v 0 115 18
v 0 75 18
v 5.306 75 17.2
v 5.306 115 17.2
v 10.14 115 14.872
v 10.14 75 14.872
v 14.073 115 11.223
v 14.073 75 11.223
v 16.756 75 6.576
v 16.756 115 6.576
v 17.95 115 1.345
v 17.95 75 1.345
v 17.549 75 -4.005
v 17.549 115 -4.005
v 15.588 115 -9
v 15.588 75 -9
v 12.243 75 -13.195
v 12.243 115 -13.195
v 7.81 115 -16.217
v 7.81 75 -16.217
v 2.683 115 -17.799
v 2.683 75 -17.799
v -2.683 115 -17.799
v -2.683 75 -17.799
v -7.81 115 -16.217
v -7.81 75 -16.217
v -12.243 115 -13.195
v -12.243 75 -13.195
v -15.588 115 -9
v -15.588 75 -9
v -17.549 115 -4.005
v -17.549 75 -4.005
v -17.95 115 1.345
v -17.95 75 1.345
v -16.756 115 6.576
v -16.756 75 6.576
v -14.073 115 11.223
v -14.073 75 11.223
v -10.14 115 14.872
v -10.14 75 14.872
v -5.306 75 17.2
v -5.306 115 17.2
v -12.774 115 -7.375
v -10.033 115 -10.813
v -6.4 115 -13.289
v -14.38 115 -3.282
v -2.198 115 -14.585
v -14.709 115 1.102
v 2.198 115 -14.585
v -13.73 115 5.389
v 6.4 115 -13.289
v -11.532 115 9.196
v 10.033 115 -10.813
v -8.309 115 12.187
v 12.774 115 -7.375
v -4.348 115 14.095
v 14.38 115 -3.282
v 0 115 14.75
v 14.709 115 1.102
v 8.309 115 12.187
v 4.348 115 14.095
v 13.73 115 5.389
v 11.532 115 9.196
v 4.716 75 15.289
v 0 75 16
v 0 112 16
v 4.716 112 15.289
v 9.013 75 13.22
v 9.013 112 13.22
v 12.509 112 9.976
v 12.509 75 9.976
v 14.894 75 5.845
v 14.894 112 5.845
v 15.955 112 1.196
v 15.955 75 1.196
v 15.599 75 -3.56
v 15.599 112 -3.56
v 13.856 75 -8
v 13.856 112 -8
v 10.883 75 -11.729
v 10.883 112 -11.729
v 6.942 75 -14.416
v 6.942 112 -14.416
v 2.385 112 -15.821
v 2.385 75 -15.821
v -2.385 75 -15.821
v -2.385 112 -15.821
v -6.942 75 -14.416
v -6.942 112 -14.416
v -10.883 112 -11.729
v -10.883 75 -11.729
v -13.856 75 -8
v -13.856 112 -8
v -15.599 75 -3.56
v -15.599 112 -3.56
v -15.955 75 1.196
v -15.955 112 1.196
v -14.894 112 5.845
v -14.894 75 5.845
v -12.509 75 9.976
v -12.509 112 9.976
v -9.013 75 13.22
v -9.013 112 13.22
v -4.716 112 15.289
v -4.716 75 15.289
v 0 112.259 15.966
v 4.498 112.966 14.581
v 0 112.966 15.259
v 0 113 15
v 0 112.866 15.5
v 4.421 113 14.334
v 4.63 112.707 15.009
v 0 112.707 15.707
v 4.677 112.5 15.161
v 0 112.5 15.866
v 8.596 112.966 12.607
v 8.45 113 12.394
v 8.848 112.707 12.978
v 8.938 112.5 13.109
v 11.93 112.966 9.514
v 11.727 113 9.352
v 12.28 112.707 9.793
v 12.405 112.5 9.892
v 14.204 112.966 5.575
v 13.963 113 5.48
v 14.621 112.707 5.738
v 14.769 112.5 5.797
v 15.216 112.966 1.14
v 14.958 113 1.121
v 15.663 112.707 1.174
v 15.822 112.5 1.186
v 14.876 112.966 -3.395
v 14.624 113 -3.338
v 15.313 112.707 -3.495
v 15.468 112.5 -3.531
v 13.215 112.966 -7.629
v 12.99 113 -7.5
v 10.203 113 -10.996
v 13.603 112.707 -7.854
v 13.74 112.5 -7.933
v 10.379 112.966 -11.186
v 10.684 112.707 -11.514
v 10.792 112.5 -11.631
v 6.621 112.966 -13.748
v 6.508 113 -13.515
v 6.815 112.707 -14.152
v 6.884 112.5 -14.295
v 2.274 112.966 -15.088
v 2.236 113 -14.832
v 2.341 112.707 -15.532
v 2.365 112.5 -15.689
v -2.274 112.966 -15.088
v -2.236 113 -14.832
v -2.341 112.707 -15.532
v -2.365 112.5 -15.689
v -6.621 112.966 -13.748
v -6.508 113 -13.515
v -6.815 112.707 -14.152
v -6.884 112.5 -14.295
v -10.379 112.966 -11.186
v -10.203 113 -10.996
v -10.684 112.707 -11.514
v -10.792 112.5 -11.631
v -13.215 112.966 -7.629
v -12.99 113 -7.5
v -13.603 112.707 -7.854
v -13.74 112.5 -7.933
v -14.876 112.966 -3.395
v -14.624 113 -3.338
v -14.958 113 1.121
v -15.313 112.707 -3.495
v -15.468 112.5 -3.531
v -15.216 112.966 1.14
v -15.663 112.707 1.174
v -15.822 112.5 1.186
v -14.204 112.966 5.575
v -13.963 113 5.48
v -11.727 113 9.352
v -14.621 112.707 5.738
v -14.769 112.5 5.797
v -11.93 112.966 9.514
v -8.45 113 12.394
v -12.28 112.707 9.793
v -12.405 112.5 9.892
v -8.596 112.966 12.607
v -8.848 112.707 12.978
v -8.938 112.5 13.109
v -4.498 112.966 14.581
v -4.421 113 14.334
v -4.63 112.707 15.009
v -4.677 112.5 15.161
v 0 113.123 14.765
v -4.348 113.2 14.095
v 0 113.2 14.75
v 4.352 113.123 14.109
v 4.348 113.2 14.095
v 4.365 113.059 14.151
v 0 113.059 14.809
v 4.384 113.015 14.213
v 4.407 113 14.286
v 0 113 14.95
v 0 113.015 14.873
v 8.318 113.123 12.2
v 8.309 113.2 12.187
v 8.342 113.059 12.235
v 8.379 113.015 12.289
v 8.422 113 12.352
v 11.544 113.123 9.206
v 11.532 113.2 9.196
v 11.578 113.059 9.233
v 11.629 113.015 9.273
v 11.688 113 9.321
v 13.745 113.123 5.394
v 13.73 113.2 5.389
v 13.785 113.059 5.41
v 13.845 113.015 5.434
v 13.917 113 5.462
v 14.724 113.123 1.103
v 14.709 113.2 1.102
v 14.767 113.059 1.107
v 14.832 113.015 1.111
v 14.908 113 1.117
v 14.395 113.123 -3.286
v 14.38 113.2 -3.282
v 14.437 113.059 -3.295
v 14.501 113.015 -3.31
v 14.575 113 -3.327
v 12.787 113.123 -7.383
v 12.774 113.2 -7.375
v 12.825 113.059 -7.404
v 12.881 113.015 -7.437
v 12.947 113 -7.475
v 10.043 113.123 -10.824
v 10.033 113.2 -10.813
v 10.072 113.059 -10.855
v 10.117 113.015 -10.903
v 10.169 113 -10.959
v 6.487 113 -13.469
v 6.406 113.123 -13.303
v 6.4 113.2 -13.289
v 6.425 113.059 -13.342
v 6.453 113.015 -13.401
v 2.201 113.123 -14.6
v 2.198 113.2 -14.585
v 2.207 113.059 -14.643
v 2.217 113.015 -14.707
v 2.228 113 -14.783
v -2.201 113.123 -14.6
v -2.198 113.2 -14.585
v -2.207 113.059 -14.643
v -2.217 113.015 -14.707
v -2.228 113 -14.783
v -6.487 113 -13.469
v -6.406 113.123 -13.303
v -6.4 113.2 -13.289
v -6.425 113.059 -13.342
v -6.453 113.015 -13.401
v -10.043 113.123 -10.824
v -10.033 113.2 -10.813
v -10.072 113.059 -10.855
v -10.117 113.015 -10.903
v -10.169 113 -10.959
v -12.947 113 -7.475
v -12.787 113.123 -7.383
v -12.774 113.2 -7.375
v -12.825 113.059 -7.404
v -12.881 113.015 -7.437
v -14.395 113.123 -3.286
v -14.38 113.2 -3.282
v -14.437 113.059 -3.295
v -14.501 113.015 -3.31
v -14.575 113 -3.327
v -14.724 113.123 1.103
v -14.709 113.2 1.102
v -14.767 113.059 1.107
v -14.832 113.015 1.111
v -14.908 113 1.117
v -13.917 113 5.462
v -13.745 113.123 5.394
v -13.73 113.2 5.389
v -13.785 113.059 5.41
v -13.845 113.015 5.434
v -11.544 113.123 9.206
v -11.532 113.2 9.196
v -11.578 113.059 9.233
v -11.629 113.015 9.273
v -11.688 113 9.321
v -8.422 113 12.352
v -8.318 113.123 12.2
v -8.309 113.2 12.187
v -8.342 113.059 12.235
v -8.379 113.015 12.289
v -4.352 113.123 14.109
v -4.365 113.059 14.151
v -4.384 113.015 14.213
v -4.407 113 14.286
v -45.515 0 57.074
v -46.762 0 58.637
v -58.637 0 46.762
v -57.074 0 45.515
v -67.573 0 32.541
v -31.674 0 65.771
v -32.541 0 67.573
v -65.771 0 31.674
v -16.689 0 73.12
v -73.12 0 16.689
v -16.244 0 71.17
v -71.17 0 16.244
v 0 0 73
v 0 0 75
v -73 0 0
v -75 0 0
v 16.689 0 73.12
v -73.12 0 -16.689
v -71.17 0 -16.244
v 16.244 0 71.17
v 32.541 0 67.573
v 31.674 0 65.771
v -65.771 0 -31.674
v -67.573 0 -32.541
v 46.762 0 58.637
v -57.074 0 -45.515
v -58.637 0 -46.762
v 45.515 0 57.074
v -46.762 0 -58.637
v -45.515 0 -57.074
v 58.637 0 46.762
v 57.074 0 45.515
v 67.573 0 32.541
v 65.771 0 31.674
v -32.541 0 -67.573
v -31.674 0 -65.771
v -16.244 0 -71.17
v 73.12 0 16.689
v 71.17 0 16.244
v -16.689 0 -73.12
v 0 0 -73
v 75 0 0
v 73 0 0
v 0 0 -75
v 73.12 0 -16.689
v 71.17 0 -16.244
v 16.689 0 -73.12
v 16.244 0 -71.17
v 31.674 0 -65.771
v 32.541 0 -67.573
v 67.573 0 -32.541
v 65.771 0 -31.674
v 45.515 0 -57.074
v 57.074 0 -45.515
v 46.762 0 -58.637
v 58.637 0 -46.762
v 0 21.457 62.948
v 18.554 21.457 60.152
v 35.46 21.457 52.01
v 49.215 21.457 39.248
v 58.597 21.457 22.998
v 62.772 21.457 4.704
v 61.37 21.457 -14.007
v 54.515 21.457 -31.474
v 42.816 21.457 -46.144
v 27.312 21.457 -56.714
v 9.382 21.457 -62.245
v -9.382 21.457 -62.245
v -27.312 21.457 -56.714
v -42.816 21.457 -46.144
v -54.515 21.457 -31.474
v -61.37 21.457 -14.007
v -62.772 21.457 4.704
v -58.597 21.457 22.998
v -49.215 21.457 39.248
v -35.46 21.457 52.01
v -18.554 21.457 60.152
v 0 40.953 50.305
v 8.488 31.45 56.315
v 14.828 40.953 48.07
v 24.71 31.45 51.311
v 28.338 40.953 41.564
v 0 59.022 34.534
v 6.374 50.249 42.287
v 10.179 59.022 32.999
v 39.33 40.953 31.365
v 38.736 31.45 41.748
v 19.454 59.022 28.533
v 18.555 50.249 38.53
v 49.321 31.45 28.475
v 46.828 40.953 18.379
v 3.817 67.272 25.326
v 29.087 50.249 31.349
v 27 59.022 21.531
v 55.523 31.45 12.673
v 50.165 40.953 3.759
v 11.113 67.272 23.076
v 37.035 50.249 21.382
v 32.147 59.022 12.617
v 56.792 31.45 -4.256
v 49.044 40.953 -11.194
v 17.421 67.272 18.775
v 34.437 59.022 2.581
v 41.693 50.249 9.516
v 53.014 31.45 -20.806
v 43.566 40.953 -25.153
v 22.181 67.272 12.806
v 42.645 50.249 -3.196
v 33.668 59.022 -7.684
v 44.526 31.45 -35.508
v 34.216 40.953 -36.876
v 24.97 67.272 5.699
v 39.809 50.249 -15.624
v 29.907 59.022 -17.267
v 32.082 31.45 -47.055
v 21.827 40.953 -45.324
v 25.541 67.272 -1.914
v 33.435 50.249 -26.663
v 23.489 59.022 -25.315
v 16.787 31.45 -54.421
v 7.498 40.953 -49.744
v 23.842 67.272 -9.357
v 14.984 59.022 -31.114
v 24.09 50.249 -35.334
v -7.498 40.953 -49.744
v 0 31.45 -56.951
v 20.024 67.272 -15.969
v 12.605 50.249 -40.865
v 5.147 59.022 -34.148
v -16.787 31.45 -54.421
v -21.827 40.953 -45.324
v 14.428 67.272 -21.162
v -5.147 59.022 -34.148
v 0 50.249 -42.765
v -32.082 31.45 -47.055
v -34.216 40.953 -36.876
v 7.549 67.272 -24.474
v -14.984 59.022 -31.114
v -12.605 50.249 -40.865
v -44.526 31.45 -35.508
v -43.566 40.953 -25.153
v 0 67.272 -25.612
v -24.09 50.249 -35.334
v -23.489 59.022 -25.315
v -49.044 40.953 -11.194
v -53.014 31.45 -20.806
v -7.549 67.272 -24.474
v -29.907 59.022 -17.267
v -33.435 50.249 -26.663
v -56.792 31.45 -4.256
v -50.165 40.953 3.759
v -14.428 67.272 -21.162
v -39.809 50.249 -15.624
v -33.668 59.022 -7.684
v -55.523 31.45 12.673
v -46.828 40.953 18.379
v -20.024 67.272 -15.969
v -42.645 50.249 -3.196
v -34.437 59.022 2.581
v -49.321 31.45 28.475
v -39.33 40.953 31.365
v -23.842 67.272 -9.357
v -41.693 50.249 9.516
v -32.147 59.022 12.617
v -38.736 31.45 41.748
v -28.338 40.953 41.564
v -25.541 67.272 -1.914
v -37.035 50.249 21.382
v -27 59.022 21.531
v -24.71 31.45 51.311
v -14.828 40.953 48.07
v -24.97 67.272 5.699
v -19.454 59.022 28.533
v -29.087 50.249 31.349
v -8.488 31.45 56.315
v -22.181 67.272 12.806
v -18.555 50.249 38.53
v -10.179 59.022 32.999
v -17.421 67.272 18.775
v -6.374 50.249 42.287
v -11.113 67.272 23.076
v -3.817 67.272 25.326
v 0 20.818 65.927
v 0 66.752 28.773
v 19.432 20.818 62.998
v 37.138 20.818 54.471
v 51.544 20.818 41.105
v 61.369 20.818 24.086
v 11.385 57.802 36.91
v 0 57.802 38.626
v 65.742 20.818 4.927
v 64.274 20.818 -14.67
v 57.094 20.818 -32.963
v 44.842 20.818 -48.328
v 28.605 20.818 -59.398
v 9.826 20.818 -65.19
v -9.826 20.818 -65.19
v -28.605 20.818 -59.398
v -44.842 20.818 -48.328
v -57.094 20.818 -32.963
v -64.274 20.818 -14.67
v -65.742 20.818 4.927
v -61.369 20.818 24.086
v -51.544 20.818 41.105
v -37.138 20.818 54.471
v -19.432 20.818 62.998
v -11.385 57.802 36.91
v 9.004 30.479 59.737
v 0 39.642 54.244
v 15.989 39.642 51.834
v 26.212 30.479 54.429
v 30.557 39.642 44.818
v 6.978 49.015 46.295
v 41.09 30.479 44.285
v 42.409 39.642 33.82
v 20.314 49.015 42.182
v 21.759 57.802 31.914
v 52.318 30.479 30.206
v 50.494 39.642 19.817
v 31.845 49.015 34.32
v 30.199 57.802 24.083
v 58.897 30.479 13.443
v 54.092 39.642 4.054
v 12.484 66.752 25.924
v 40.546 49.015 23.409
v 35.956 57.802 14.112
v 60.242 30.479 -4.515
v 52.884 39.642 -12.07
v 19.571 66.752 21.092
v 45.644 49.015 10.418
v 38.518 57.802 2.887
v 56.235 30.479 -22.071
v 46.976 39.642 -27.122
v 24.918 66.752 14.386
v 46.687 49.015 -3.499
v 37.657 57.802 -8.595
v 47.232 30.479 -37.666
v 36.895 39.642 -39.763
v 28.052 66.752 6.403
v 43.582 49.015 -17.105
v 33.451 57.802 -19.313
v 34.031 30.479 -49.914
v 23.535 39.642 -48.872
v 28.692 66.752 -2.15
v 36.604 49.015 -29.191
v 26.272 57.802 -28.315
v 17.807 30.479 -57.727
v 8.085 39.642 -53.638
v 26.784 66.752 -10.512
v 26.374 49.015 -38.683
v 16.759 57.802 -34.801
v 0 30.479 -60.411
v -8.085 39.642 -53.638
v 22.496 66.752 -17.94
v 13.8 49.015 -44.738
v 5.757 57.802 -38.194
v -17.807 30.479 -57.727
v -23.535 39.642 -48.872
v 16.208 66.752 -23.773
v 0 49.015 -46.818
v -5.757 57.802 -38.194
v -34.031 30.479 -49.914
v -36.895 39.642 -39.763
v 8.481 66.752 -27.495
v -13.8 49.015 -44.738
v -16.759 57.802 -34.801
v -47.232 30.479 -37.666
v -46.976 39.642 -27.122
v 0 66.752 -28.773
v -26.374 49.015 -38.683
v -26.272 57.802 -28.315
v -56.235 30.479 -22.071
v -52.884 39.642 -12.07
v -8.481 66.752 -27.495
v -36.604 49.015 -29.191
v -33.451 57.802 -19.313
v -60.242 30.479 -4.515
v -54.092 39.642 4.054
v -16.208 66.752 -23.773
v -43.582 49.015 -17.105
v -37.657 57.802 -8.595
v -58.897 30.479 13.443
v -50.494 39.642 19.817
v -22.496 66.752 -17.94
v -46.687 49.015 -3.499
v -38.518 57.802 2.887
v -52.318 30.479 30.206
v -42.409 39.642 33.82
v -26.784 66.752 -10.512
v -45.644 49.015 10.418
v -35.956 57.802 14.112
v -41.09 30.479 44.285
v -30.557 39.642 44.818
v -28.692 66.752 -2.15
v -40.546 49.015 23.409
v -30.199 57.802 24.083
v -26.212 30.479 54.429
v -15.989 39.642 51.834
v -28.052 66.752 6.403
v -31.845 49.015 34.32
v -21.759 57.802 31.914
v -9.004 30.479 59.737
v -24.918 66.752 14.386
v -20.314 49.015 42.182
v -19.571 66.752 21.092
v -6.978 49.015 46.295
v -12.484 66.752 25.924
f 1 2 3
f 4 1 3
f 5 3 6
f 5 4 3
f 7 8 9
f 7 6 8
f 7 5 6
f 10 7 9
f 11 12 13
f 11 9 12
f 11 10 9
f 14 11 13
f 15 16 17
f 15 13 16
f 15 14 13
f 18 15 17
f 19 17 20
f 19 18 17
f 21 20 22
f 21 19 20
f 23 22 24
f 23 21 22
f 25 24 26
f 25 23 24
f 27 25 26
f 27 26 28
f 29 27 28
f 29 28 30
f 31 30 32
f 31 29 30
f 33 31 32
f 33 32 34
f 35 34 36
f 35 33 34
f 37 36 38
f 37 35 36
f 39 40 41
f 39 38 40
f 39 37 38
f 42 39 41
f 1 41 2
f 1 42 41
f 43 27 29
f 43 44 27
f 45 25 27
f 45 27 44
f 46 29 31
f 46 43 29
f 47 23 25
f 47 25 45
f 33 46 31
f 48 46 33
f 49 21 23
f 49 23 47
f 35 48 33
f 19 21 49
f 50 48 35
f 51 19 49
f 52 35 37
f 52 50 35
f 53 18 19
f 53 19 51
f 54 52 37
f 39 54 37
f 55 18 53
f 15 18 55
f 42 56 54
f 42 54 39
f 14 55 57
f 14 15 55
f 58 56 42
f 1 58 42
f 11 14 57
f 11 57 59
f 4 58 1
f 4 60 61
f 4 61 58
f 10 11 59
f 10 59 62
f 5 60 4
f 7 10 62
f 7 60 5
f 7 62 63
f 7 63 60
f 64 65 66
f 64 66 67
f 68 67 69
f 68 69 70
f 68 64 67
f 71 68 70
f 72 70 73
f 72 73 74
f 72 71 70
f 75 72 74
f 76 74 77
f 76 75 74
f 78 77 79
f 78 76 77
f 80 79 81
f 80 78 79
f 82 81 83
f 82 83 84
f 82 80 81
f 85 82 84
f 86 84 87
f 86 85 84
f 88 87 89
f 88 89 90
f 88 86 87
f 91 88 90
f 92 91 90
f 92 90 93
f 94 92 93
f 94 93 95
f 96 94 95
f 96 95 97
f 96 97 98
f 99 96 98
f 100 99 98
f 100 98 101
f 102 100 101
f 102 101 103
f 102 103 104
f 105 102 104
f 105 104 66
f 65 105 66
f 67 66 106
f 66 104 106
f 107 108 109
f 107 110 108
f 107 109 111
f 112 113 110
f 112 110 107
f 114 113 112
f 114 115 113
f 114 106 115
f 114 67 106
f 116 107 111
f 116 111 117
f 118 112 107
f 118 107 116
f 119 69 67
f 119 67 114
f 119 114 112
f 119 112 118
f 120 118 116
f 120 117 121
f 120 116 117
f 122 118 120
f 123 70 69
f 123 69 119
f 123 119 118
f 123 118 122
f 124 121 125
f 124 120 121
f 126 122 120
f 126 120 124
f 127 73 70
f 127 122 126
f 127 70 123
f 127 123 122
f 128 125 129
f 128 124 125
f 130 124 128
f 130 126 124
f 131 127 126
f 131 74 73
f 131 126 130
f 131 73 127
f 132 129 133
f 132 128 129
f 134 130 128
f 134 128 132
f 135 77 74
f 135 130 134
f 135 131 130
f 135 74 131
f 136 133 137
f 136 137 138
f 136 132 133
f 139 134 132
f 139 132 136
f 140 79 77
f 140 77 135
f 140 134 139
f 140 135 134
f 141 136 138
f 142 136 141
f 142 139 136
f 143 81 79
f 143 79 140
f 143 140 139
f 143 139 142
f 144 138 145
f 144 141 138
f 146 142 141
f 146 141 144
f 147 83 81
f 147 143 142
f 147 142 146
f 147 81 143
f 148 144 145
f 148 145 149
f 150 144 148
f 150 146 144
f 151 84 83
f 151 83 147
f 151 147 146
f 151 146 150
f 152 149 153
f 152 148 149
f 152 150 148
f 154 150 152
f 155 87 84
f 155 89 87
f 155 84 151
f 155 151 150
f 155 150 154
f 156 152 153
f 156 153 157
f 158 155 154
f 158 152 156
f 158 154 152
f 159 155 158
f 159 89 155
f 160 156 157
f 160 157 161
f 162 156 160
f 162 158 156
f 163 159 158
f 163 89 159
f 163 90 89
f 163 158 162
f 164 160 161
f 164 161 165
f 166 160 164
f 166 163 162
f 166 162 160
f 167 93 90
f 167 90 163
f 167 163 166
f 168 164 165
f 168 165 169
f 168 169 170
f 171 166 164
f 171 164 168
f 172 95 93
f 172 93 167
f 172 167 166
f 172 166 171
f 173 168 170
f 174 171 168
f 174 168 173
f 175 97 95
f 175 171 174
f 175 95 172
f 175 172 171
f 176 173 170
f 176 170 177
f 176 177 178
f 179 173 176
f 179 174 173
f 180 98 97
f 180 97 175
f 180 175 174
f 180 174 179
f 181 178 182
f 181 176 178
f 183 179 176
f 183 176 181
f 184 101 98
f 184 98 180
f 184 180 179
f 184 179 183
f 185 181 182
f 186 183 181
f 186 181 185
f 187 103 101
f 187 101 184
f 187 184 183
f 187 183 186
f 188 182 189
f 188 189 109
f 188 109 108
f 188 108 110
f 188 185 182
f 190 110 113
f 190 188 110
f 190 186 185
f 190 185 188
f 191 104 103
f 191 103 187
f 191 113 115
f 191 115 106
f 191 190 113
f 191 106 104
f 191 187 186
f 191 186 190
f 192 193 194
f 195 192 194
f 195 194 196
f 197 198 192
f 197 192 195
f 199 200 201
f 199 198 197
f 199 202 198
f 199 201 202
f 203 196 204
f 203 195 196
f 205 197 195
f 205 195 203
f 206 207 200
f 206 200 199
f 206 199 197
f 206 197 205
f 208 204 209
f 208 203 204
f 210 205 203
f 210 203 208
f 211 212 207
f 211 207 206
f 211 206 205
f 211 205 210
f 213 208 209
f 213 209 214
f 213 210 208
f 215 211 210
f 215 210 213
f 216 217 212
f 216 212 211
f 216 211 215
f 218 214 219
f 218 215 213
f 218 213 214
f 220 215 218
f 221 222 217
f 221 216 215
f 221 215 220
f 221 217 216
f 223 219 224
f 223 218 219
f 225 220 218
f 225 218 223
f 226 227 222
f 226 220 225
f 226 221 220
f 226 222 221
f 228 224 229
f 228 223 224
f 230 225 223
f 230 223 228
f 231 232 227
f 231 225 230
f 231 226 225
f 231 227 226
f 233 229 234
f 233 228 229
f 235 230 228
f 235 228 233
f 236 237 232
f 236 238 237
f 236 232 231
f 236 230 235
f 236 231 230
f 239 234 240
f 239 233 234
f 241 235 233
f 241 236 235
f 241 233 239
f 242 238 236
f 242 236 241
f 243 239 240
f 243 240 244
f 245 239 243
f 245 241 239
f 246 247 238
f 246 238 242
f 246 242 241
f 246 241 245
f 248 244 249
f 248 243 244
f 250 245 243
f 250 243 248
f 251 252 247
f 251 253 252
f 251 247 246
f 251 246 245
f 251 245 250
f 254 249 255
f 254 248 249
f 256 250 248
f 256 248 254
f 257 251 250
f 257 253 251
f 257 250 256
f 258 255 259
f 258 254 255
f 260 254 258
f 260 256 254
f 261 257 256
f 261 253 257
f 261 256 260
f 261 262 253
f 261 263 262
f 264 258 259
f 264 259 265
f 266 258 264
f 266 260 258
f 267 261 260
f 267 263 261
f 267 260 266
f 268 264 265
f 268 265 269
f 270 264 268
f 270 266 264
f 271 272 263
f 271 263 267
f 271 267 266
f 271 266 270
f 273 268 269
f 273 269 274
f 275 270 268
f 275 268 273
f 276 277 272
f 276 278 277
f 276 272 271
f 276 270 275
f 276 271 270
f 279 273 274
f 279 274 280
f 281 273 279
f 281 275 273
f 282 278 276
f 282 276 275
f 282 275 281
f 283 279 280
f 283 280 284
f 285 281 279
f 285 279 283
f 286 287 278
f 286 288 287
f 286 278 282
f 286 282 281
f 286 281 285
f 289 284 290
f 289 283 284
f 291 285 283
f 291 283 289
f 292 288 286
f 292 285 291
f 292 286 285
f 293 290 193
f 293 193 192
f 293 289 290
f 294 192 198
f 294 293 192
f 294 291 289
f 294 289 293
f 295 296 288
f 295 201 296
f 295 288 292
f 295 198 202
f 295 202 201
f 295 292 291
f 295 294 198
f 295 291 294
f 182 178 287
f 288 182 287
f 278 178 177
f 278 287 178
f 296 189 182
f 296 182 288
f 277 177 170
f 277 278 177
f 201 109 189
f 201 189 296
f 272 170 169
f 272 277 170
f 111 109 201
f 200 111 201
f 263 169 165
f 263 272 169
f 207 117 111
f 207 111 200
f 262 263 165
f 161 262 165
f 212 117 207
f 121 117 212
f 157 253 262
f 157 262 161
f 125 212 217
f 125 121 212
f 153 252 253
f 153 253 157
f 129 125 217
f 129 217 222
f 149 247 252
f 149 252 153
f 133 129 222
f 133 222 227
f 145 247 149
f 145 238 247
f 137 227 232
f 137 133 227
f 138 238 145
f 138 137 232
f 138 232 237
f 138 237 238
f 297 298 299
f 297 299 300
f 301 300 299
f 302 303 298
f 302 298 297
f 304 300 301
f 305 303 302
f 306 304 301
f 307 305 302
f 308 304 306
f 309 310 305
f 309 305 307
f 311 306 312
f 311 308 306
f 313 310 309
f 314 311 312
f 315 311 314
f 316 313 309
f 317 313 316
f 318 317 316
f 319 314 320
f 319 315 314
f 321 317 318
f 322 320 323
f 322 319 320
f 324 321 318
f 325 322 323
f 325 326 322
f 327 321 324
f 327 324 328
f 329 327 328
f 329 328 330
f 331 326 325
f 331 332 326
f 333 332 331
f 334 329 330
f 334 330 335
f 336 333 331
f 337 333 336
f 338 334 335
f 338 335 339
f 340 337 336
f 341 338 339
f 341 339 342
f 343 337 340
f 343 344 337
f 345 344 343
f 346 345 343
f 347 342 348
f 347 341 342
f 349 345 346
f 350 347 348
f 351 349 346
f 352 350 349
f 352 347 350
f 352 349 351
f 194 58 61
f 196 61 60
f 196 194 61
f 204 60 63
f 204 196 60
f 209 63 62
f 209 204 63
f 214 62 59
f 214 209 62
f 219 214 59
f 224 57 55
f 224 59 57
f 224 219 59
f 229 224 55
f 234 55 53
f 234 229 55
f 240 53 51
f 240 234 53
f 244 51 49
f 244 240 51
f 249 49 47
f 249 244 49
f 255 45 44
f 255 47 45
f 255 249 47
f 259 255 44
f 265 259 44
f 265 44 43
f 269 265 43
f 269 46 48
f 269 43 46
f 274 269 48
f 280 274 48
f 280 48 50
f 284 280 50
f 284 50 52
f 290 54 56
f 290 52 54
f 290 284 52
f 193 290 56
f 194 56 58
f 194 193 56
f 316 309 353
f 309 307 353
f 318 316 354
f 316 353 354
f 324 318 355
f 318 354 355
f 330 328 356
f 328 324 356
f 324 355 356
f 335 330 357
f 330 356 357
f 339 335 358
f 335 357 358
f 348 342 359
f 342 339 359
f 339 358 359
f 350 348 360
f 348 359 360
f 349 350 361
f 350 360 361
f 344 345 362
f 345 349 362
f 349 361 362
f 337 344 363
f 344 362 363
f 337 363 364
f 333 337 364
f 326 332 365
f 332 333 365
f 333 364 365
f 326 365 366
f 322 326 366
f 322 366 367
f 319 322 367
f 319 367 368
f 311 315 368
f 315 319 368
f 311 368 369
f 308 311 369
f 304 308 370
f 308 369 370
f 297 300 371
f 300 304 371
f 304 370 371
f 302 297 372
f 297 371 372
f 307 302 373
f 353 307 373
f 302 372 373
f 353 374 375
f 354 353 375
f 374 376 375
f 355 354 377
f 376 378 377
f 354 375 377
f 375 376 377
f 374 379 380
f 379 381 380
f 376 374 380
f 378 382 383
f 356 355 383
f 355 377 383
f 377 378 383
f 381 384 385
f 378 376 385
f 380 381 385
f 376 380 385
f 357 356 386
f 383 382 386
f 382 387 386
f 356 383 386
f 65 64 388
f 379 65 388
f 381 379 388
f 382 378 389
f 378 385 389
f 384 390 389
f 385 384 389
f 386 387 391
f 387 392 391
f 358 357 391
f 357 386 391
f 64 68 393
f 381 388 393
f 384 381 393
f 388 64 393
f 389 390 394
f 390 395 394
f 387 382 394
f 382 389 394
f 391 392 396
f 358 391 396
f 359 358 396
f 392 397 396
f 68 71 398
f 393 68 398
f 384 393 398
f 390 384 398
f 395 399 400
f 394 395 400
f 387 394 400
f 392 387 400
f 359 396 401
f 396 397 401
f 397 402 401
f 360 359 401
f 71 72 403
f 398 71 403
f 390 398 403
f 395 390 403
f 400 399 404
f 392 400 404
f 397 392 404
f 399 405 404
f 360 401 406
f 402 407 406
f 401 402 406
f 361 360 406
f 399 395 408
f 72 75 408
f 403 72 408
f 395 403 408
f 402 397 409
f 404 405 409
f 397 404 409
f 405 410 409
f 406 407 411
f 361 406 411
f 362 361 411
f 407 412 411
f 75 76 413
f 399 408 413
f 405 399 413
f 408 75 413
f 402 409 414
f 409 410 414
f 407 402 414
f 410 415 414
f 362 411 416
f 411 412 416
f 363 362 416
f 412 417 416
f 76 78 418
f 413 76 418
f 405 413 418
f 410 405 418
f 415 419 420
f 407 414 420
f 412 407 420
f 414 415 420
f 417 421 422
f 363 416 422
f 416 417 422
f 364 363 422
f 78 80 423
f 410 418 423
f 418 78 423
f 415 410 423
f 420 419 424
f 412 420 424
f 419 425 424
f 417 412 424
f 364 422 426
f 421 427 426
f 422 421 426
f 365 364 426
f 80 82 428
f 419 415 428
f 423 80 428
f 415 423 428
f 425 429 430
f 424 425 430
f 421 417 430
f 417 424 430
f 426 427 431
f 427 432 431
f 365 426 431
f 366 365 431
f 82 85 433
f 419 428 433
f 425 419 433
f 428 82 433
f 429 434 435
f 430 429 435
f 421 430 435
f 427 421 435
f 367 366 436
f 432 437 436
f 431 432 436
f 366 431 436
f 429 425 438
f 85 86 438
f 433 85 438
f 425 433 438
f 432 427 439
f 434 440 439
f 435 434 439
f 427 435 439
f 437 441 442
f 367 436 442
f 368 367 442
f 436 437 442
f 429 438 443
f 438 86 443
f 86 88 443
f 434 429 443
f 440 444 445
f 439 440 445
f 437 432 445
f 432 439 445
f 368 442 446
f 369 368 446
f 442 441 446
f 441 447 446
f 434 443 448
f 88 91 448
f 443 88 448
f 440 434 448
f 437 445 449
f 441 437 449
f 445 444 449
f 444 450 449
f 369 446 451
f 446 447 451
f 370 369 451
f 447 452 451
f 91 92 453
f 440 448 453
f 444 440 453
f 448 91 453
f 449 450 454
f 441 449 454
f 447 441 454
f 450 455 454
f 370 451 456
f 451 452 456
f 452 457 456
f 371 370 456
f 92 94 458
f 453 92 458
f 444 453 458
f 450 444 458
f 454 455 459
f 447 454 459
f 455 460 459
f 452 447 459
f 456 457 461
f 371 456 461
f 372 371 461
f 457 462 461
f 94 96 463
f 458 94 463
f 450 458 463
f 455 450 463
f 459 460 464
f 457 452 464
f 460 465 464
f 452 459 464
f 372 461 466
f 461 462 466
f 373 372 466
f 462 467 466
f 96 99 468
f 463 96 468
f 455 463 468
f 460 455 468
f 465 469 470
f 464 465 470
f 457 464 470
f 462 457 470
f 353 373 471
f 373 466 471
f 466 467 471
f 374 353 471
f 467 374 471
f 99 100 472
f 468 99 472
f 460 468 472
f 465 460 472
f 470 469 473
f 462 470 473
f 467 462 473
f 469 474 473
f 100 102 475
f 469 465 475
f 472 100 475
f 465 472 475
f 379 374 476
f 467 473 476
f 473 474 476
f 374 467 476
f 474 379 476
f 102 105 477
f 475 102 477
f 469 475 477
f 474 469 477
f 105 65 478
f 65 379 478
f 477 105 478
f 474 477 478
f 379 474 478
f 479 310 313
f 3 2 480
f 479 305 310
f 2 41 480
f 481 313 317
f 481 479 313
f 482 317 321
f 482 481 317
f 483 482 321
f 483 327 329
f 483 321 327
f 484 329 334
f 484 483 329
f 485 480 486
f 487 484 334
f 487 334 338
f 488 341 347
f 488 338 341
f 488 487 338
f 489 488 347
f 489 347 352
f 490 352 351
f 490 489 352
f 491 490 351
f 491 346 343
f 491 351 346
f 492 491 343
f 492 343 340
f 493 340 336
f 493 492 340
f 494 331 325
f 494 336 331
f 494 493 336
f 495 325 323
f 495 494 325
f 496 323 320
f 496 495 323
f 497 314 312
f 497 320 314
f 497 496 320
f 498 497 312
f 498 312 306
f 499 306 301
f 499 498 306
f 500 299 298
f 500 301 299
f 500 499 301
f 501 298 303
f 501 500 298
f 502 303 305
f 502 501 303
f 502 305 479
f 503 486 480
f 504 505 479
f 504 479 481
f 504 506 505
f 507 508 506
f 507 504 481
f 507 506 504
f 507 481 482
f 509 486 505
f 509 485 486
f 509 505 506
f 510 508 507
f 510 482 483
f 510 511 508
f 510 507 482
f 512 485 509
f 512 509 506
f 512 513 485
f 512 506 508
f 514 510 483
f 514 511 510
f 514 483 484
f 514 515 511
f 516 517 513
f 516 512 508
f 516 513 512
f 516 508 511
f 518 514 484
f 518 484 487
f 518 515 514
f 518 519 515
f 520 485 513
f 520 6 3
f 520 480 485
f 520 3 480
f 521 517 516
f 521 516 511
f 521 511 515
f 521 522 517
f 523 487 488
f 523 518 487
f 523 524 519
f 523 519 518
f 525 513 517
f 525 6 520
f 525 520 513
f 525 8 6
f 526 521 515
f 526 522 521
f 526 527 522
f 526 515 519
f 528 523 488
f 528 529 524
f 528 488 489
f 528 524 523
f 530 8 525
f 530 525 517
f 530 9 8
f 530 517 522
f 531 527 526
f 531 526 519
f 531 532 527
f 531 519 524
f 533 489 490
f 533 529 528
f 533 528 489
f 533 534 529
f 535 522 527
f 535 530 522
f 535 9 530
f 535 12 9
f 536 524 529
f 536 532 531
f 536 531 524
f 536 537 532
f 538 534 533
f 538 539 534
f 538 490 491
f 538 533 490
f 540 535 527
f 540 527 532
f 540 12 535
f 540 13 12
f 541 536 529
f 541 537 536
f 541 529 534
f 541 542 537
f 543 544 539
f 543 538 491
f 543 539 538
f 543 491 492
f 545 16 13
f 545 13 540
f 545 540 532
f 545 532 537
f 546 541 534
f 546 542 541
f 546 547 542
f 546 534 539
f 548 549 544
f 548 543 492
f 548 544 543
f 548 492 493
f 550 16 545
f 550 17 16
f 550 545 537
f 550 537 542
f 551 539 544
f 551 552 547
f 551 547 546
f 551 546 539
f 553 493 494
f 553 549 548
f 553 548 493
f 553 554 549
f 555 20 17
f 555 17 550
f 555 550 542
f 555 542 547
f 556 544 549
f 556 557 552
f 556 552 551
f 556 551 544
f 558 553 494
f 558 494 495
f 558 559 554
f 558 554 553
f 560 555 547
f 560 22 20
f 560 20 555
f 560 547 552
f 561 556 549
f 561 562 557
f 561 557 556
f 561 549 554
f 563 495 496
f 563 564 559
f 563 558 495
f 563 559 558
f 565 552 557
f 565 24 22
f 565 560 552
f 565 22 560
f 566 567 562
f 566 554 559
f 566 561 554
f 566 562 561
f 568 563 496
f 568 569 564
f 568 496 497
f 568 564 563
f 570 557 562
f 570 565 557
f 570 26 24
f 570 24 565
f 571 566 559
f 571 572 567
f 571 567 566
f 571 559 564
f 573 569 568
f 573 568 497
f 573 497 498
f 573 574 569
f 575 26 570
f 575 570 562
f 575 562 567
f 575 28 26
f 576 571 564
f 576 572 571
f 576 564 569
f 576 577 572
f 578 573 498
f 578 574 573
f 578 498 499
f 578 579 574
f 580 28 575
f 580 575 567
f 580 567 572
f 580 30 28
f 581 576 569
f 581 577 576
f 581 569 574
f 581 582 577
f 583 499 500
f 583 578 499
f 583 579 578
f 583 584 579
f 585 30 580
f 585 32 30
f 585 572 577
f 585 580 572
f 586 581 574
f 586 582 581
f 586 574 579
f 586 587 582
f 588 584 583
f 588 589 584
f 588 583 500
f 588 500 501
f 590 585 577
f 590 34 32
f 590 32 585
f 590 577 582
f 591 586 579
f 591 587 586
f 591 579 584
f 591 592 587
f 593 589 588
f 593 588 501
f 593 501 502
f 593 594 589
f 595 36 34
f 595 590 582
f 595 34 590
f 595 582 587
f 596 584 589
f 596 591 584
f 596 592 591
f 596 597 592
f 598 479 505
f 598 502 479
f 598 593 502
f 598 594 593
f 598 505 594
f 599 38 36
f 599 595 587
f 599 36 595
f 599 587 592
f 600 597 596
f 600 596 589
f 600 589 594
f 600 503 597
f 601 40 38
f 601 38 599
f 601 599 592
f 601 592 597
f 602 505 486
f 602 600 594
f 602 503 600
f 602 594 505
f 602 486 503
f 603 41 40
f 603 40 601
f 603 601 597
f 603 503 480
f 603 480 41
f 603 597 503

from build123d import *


with BuildPart() as part:
    # Sketch1 → Revolve1 (revolve)
    with BuildSketch(Plane.XY, mode=Mode.PRIVATE) as revolve1_sk:
        with BuildLine():
            add(Edge.make_bspline(
                [(-75, 0), (-58.406274113, 46.597036045), (-18, 75)],
                knots=[0, 0, 0, 1, 1, 1], degree=2))
            Line((-75, 0), (-73, 0))
            add(Edge.make_bspline(
                [(-73, 0), (-55.203968241, 45.604593249), (-16, 75)],
                knots=[0, 0, 0, 1, 1, 1], degree=2))
            Line((-16, 75), (-16, 112))
            ThreePointArc((-16, 112), (-15.707106781, 112.707106781), (-15, 113))
            Line((-15, 113), (-14.95, 113))
            ThreePointArc((-14.95, 113), (-14.808578644, 113.058578644), (-14.75, 113.2))
            Line((-14.75, 113.2), (-14.75, 115))
            Line((-14.75, 115), (-18, 115))
            Line((-18, 115), (-18, 75))
        make_face()
        with BuildLine():
            add(Edge.make_bspline(
                [(73, 0), (55.203968241, 45.604593249), (16, 75)],
                knots=[0, 0, 0, 1, 1, 1], degree=2))
            Line((73, 0), (75, 0))
            add(Edge.make_bspline(
                [(75, 0), (58.406274113, 46.597036045), (18, 75)],
                knots=[0, 0, 0, 1, 1, 1], degree=2))
            Line((18, 75), (18, 115))
            Line((18, 115), (14.75, 115))
            Line((14.75, 115), (14.75, 113.2))
            ThreePointArc((14.75, 113.2), (14.808578644, 113.058578644), (14.95, 113))
            Line((14.95, 113), (15, 113))
            ThreePointArc((15, 113), (15.707106781, 112.707106781), (16, 112))
            Line((16, 112), (16, 75))
        make_face()
    revolve(revolve1_sk.sketch.rotate(Axis((0, 0, 0), (0, 1, 0)), 270), axis=Axis((0, 0, 0), (0, 1, 0)))


solid = part.part
